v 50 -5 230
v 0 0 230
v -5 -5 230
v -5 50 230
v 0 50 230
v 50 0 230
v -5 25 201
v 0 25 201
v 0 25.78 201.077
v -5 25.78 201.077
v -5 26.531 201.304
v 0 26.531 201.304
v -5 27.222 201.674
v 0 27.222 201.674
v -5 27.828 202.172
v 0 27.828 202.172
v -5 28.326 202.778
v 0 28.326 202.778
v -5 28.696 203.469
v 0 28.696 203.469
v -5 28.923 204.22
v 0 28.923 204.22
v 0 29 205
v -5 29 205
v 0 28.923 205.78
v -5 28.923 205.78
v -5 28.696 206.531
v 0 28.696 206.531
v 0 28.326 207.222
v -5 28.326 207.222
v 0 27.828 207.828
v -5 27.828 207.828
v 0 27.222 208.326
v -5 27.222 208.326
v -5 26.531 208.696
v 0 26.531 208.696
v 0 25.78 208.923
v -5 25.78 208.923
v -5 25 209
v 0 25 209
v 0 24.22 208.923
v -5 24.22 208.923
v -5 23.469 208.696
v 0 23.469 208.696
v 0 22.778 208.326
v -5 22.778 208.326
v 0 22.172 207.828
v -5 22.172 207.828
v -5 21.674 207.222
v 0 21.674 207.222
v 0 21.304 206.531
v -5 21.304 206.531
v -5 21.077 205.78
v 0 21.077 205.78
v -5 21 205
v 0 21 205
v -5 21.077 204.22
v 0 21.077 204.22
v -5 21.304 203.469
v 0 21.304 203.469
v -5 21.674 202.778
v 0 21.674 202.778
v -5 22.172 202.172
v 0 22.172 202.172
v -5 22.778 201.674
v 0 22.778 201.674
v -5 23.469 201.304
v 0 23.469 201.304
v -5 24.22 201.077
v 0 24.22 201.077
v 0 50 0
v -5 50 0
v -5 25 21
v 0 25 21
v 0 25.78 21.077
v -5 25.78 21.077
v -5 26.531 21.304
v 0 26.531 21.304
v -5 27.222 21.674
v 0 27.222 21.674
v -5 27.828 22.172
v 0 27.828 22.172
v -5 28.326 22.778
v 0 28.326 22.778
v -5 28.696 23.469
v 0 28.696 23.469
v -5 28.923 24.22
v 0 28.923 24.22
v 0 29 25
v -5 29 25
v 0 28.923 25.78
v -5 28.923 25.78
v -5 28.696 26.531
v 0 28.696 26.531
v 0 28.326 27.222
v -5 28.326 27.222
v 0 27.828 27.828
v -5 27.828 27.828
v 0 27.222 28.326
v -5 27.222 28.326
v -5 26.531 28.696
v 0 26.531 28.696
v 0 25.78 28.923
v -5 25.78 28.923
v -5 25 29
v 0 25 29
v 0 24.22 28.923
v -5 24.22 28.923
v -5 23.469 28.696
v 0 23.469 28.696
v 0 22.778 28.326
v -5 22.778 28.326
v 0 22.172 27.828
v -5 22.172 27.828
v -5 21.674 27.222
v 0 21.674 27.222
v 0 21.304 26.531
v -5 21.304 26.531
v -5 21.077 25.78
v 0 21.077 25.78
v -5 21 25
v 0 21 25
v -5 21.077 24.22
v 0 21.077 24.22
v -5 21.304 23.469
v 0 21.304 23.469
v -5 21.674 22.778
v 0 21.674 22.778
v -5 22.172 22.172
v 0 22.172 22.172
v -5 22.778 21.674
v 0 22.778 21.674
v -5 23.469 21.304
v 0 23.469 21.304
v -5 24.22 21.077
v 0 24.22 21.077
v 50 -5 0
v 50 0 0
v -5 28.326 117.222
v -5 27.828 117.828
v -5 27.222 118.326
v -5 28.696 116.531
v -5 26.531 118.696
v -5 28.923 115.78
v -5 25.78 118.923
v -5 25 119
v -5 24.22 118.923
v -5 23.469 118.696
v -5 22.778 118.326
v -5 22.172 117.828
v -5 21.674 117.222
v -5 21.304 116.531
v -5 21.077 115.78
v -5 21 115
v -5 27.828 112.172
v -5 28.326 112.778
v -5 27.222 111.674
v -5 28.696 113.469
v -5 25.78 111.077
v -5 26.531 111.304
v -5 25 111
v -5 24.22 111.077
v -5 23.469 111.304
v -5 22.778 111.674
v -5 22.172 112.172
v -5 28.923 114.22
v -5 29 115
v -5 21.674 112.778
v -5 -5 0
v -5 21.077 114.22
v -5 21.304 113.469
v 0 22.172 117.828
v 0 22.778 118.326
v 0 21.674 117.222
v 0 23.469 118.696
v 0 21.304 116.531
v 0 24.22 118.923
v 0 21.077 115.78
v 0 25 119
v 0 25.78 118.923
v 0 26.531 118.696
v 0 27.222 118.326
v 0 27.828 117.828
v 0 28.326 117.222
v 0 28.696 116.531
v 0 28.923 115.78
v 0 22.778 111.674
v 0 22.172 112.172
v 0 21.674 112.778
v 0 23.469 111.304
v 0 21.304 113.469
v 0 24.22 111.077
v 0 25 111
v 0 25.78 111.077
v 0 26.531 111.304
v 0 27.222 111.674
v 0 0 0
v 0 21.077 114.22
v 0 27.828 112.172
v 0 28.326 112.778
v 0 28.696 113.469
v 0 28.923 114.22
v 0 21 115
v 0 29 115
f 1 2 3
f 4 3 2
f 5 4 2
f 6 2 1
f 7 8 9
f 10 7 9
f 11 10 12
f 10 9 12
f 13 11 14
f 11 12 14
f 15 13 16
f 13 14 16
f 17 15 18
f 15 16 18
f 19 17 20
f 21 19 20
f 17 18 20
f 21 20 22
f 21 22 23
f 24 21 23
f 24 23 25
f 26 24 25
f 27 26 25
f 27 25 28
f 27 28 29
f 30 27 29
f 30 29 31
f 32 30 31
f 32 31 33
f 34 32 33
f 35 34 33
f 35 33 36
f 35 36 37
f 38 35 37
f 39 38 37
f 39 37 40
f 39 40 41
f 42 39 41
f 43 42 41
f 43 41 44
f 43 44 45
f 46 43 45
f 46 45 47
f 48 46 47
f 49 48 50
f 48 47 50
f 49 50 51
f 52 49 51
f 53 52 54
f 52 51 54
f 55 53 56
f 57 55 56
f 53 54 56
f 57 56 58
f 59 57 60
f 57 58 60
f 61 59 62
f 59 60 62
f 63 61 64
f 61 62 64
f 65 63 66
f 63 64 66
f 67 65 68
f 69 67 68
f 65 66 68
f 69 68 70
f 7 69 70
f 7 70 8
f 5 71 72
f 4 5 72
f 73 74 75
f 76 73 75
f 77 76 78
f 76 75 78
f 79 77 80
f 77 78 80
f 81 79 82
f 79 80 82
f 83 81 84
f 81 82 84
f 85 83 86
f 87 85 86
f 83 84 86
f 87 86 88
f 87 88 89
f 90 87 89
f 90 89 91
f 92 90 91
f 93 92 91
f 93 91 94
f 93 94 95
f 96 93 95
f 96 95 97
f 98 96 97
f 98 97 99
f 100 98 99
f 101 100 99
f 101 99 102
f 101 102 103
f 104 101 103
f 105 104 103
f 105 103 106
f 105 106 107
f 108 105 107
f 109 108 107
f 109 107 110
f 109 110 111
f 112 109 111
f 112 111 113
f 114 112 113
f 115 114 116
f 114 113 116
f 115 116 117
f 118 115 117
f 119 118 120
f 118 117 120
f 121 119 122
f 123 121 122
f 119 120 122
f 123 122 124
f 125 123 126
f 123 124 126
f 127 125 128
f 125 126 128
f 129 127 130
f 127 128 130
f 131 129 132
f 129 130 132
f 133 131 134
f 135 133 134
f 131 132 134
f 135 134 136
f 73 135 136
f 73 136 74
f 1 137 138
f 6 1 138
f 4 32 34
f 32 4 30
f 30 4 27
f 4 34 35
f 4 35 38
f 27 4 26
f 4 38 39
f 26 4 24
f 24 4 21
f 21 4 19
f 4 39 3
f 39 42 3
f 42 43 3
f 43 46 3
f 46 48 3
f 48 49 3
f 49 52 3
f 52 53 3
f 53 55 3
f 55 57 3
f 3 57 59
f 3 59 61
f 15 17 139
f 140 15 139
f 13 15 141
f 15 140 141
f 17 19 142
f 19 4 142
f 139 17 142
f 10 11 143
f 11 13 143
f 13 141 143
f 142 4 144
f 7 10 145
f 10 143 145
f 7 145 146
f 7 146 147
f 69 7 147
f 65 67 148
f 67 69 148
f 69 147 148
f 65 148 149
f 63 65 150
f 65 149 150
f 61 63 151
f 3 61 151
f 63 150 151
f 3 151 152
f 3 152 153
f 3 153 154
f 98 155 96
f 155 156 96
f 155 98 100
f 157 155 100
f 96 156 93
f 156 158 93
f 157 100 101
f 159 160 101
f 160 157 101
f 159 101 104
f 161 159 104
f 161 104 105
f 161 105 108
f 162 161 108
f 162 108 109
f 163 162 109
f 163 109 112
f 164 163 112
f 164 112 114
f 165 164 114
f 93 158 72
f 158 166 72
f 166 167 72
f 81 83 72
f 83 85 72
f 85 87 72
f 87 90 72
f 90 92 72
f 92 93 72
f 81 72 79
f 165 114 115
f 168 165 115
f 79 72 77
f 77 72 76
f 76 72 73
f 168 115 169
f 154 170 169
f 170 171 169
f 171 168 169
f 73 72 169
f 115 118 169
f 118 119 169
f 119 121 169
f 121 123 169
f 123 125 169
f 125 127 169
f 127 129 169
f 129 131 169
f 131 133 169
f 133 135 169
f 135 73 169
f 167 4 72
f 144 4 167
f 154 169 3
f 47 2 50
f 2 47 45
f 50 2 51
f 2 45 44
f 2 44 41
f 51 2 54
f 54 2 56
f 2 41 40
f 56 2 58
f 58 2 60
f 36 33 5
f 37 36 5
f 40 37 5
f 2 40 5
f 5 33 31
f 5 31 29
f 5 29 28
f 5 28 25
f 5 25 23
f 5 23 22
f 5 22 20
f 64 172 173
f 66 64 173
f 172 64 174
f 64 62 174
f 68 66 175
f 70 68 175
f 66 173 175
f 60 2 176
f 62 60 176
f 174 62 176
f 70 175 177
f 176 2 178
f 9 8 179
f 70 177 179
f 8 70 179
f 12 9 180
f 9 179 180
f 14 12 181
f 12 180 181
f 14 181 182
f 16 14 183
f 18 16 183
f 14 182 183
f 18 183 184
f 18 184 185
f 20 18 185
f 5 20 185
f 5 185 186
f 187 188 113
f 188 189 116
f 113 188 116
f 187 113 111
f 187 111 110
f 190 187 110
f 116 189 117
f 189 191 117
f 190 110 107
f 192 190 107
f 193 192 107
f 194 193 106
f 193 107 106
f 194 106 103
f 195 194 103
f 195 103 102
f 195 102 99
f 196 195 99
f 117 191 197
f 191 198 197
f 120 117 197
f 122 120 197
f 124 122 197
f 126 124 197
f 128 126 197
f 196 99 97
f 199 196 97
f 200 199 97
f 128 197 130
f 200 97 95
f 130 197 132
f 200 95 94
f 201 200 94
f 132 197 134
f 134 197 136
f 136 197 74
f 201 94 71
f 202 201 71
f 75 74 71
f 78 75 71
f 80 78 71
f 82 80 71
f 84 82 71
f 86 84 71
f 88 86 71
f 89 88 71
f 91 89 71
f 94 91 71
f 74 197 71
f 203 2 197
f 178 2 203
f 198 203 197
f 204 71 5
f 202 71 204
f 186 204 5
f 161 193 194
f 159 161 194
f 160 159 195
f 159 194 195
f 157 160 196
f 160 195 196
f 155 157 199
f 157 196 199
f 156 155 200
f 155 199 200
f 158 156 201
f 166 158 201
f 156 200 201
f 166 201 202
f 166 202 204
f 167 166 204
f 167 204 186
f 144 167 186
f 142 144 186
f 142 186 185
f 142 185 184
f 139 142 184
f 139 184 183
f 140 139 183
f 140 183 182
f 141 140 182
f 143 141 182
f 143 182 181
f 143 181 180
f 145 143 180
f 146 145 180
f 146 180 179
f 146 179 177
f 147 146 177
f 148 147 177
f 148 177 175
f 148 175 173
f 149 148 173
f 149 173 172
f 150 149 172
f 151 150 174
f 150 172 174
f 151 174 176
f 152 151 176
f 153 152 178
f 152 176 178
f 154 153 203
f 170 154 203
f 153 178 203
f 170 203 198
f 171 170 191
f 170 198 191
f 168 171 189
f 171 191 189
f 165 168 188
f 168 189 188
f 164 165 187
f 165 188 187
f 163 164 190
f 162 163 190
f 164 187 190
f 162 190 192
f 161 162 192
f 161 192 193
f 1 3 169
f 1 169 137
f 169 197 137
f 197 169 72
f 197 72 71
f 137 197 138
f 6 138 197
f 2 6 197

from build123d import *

# Parameters (mm, degrees)
BOSS_EXTRUDE1_DEPTH = 230
SKETCH2_R           = 4
CUT_EXTRUDE1_DEPTH  = 241.62418831


with BuildPart() as part:
    # Sketch1 → Boss-Extrude1 (new body)
    with BuildSketch(Plane.XY):
        Polygon((0, 0), (0, 50), (-5, 50), (-5, 0), (-5, -5), (50, -5), (50, 0), align=None)
    extrude(amount=BOSS_EXTRUDE1_DEPTH)

    # Sketch2 → Cut-Extrude1 (cut, through all)
    with BuildSketch(Plane(origin=(0, 0, 0), x_dir=(0, 0, -1), z_dir=(1, 0, 0))):
        with Locations((-115, 25)):
            Circle(SKETCH2_R)
        with Locations((-25, 25)):
            Circle(SKETCH2_R)
        with Locations((-205, 25)):
            Circle(SKETCH2_R)
    extrude(amount=-CUT_EXTRUDE1_DEPTH, mode=Mode.SUBTRACT)


solid = part.part
